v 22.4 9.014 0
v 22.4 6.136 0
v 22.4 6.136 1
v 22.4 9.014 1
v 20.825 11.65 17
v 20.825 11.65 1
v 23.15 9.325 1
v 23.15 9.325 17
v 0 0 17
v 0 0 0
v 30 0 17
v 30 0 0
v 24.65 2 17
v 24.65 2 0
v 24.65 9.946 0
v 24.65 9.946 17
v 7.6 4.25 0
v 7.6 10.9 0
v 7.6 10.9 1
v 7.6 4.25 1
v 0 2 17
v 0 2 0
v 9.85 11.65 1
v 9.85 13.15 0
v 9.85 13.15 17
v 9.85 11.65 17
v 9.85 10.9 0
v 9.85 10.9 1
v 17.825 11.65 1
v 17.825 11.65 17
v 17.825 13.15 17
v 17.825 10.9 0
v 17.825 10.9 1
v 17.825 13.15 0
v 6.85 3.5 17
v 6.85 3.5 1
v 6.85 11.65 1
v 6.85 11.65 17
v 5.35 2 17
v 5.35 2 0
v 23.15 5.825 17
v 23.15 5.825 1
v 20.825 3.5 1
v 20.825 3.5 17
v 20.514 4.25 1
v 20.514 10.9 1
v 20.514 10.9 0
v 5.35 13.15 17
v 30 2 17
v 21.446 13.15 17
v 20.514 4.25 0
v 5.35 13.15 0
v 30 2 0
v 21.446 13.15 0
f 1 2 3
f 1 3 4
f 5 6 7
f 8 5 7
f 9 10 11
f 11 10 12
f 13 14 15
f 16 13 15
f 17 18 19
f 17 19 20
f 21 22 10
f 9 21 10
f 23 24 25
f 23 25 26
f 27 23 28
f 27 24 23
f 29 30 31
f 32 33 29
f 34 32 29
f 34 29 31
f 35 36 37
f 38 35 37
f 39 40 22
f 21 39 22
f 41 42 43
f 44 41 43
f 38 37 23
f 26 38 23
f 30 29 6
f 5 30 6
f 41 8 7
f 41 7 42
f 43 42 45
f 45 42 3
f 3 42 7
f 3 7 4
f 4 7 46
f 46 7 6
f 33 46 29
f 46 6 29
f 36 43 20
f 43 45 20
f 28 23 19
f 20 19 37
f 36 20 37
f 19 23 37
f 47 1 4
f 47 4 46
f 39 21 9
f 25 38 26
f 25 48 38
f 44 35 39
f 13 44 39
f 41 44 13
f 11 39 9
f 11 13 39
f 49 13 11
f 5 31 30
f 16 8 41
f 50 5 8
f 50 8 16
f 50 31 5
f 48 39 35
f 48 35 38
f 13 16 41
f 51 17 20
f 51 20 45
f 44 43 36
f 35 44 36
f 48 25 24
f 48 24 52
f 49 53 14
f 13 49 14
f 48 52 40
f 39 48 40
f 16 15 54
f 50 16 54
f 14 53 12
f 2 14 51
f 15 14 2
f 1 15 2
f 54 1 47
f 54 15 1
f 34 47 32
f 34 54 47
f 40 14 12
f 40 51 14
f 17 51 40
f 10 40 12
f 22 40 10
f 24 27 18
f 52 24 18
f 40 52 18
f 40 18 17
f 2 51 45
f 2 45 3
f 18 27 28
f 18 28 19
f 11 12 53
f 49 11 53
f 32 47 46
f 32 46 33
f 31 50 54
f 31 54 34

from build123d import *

# Parameters (mm, degrees)
EXTRUDE_1285_DEPTH = 17
EXTRUDE_1381_DEPTH = 1


with BuildPart() as part:
    # Sketch 270 → Extrude 1285 (new body)
    with BuildSketch(Plane.XY):
        Polygon((9.85, 13.15), (5.35, 13.15), (5.35, 2), (0, 2), (0, 0), (30, 0), (30, 2), (24.65, 2), (24.65, 9.946320344), (21.446320344, 13.15), (17.825, 13.15), (17.825, 11.65), (20.825, 11.65), (23.15, 9.325), (23.15, 5.825), (20.825, 3.5), (6.85, 3.5), (6.85, 11.65), (9.85, 11.65), align=None)
    extrude(amount=EXTRUDE_1285_DEPTH)

    # Эскиз1<6> → Extrude 1381 (add)
    with BuildSketch(Plane.XY):
        Polygon((9.85, 10.9), (9.85, 11.65), (6.85, 11.65), (6.85, 3.5), (20.825, 3.5), (23.15, 5.825), (23.15, 9.325), (20.825, 11.65), (17.825, 11.65), (17.825, 10.9), (20.514339828, 10.9), (22.4, 9.014339828), (22.4, 6.135660172), (20.514339828, 4.25), (7.6, 4.25), (7.6, 10.9), align=None)
    extrude(amount=EXTRUDE_1381_DEPTH)


solid = part.part
